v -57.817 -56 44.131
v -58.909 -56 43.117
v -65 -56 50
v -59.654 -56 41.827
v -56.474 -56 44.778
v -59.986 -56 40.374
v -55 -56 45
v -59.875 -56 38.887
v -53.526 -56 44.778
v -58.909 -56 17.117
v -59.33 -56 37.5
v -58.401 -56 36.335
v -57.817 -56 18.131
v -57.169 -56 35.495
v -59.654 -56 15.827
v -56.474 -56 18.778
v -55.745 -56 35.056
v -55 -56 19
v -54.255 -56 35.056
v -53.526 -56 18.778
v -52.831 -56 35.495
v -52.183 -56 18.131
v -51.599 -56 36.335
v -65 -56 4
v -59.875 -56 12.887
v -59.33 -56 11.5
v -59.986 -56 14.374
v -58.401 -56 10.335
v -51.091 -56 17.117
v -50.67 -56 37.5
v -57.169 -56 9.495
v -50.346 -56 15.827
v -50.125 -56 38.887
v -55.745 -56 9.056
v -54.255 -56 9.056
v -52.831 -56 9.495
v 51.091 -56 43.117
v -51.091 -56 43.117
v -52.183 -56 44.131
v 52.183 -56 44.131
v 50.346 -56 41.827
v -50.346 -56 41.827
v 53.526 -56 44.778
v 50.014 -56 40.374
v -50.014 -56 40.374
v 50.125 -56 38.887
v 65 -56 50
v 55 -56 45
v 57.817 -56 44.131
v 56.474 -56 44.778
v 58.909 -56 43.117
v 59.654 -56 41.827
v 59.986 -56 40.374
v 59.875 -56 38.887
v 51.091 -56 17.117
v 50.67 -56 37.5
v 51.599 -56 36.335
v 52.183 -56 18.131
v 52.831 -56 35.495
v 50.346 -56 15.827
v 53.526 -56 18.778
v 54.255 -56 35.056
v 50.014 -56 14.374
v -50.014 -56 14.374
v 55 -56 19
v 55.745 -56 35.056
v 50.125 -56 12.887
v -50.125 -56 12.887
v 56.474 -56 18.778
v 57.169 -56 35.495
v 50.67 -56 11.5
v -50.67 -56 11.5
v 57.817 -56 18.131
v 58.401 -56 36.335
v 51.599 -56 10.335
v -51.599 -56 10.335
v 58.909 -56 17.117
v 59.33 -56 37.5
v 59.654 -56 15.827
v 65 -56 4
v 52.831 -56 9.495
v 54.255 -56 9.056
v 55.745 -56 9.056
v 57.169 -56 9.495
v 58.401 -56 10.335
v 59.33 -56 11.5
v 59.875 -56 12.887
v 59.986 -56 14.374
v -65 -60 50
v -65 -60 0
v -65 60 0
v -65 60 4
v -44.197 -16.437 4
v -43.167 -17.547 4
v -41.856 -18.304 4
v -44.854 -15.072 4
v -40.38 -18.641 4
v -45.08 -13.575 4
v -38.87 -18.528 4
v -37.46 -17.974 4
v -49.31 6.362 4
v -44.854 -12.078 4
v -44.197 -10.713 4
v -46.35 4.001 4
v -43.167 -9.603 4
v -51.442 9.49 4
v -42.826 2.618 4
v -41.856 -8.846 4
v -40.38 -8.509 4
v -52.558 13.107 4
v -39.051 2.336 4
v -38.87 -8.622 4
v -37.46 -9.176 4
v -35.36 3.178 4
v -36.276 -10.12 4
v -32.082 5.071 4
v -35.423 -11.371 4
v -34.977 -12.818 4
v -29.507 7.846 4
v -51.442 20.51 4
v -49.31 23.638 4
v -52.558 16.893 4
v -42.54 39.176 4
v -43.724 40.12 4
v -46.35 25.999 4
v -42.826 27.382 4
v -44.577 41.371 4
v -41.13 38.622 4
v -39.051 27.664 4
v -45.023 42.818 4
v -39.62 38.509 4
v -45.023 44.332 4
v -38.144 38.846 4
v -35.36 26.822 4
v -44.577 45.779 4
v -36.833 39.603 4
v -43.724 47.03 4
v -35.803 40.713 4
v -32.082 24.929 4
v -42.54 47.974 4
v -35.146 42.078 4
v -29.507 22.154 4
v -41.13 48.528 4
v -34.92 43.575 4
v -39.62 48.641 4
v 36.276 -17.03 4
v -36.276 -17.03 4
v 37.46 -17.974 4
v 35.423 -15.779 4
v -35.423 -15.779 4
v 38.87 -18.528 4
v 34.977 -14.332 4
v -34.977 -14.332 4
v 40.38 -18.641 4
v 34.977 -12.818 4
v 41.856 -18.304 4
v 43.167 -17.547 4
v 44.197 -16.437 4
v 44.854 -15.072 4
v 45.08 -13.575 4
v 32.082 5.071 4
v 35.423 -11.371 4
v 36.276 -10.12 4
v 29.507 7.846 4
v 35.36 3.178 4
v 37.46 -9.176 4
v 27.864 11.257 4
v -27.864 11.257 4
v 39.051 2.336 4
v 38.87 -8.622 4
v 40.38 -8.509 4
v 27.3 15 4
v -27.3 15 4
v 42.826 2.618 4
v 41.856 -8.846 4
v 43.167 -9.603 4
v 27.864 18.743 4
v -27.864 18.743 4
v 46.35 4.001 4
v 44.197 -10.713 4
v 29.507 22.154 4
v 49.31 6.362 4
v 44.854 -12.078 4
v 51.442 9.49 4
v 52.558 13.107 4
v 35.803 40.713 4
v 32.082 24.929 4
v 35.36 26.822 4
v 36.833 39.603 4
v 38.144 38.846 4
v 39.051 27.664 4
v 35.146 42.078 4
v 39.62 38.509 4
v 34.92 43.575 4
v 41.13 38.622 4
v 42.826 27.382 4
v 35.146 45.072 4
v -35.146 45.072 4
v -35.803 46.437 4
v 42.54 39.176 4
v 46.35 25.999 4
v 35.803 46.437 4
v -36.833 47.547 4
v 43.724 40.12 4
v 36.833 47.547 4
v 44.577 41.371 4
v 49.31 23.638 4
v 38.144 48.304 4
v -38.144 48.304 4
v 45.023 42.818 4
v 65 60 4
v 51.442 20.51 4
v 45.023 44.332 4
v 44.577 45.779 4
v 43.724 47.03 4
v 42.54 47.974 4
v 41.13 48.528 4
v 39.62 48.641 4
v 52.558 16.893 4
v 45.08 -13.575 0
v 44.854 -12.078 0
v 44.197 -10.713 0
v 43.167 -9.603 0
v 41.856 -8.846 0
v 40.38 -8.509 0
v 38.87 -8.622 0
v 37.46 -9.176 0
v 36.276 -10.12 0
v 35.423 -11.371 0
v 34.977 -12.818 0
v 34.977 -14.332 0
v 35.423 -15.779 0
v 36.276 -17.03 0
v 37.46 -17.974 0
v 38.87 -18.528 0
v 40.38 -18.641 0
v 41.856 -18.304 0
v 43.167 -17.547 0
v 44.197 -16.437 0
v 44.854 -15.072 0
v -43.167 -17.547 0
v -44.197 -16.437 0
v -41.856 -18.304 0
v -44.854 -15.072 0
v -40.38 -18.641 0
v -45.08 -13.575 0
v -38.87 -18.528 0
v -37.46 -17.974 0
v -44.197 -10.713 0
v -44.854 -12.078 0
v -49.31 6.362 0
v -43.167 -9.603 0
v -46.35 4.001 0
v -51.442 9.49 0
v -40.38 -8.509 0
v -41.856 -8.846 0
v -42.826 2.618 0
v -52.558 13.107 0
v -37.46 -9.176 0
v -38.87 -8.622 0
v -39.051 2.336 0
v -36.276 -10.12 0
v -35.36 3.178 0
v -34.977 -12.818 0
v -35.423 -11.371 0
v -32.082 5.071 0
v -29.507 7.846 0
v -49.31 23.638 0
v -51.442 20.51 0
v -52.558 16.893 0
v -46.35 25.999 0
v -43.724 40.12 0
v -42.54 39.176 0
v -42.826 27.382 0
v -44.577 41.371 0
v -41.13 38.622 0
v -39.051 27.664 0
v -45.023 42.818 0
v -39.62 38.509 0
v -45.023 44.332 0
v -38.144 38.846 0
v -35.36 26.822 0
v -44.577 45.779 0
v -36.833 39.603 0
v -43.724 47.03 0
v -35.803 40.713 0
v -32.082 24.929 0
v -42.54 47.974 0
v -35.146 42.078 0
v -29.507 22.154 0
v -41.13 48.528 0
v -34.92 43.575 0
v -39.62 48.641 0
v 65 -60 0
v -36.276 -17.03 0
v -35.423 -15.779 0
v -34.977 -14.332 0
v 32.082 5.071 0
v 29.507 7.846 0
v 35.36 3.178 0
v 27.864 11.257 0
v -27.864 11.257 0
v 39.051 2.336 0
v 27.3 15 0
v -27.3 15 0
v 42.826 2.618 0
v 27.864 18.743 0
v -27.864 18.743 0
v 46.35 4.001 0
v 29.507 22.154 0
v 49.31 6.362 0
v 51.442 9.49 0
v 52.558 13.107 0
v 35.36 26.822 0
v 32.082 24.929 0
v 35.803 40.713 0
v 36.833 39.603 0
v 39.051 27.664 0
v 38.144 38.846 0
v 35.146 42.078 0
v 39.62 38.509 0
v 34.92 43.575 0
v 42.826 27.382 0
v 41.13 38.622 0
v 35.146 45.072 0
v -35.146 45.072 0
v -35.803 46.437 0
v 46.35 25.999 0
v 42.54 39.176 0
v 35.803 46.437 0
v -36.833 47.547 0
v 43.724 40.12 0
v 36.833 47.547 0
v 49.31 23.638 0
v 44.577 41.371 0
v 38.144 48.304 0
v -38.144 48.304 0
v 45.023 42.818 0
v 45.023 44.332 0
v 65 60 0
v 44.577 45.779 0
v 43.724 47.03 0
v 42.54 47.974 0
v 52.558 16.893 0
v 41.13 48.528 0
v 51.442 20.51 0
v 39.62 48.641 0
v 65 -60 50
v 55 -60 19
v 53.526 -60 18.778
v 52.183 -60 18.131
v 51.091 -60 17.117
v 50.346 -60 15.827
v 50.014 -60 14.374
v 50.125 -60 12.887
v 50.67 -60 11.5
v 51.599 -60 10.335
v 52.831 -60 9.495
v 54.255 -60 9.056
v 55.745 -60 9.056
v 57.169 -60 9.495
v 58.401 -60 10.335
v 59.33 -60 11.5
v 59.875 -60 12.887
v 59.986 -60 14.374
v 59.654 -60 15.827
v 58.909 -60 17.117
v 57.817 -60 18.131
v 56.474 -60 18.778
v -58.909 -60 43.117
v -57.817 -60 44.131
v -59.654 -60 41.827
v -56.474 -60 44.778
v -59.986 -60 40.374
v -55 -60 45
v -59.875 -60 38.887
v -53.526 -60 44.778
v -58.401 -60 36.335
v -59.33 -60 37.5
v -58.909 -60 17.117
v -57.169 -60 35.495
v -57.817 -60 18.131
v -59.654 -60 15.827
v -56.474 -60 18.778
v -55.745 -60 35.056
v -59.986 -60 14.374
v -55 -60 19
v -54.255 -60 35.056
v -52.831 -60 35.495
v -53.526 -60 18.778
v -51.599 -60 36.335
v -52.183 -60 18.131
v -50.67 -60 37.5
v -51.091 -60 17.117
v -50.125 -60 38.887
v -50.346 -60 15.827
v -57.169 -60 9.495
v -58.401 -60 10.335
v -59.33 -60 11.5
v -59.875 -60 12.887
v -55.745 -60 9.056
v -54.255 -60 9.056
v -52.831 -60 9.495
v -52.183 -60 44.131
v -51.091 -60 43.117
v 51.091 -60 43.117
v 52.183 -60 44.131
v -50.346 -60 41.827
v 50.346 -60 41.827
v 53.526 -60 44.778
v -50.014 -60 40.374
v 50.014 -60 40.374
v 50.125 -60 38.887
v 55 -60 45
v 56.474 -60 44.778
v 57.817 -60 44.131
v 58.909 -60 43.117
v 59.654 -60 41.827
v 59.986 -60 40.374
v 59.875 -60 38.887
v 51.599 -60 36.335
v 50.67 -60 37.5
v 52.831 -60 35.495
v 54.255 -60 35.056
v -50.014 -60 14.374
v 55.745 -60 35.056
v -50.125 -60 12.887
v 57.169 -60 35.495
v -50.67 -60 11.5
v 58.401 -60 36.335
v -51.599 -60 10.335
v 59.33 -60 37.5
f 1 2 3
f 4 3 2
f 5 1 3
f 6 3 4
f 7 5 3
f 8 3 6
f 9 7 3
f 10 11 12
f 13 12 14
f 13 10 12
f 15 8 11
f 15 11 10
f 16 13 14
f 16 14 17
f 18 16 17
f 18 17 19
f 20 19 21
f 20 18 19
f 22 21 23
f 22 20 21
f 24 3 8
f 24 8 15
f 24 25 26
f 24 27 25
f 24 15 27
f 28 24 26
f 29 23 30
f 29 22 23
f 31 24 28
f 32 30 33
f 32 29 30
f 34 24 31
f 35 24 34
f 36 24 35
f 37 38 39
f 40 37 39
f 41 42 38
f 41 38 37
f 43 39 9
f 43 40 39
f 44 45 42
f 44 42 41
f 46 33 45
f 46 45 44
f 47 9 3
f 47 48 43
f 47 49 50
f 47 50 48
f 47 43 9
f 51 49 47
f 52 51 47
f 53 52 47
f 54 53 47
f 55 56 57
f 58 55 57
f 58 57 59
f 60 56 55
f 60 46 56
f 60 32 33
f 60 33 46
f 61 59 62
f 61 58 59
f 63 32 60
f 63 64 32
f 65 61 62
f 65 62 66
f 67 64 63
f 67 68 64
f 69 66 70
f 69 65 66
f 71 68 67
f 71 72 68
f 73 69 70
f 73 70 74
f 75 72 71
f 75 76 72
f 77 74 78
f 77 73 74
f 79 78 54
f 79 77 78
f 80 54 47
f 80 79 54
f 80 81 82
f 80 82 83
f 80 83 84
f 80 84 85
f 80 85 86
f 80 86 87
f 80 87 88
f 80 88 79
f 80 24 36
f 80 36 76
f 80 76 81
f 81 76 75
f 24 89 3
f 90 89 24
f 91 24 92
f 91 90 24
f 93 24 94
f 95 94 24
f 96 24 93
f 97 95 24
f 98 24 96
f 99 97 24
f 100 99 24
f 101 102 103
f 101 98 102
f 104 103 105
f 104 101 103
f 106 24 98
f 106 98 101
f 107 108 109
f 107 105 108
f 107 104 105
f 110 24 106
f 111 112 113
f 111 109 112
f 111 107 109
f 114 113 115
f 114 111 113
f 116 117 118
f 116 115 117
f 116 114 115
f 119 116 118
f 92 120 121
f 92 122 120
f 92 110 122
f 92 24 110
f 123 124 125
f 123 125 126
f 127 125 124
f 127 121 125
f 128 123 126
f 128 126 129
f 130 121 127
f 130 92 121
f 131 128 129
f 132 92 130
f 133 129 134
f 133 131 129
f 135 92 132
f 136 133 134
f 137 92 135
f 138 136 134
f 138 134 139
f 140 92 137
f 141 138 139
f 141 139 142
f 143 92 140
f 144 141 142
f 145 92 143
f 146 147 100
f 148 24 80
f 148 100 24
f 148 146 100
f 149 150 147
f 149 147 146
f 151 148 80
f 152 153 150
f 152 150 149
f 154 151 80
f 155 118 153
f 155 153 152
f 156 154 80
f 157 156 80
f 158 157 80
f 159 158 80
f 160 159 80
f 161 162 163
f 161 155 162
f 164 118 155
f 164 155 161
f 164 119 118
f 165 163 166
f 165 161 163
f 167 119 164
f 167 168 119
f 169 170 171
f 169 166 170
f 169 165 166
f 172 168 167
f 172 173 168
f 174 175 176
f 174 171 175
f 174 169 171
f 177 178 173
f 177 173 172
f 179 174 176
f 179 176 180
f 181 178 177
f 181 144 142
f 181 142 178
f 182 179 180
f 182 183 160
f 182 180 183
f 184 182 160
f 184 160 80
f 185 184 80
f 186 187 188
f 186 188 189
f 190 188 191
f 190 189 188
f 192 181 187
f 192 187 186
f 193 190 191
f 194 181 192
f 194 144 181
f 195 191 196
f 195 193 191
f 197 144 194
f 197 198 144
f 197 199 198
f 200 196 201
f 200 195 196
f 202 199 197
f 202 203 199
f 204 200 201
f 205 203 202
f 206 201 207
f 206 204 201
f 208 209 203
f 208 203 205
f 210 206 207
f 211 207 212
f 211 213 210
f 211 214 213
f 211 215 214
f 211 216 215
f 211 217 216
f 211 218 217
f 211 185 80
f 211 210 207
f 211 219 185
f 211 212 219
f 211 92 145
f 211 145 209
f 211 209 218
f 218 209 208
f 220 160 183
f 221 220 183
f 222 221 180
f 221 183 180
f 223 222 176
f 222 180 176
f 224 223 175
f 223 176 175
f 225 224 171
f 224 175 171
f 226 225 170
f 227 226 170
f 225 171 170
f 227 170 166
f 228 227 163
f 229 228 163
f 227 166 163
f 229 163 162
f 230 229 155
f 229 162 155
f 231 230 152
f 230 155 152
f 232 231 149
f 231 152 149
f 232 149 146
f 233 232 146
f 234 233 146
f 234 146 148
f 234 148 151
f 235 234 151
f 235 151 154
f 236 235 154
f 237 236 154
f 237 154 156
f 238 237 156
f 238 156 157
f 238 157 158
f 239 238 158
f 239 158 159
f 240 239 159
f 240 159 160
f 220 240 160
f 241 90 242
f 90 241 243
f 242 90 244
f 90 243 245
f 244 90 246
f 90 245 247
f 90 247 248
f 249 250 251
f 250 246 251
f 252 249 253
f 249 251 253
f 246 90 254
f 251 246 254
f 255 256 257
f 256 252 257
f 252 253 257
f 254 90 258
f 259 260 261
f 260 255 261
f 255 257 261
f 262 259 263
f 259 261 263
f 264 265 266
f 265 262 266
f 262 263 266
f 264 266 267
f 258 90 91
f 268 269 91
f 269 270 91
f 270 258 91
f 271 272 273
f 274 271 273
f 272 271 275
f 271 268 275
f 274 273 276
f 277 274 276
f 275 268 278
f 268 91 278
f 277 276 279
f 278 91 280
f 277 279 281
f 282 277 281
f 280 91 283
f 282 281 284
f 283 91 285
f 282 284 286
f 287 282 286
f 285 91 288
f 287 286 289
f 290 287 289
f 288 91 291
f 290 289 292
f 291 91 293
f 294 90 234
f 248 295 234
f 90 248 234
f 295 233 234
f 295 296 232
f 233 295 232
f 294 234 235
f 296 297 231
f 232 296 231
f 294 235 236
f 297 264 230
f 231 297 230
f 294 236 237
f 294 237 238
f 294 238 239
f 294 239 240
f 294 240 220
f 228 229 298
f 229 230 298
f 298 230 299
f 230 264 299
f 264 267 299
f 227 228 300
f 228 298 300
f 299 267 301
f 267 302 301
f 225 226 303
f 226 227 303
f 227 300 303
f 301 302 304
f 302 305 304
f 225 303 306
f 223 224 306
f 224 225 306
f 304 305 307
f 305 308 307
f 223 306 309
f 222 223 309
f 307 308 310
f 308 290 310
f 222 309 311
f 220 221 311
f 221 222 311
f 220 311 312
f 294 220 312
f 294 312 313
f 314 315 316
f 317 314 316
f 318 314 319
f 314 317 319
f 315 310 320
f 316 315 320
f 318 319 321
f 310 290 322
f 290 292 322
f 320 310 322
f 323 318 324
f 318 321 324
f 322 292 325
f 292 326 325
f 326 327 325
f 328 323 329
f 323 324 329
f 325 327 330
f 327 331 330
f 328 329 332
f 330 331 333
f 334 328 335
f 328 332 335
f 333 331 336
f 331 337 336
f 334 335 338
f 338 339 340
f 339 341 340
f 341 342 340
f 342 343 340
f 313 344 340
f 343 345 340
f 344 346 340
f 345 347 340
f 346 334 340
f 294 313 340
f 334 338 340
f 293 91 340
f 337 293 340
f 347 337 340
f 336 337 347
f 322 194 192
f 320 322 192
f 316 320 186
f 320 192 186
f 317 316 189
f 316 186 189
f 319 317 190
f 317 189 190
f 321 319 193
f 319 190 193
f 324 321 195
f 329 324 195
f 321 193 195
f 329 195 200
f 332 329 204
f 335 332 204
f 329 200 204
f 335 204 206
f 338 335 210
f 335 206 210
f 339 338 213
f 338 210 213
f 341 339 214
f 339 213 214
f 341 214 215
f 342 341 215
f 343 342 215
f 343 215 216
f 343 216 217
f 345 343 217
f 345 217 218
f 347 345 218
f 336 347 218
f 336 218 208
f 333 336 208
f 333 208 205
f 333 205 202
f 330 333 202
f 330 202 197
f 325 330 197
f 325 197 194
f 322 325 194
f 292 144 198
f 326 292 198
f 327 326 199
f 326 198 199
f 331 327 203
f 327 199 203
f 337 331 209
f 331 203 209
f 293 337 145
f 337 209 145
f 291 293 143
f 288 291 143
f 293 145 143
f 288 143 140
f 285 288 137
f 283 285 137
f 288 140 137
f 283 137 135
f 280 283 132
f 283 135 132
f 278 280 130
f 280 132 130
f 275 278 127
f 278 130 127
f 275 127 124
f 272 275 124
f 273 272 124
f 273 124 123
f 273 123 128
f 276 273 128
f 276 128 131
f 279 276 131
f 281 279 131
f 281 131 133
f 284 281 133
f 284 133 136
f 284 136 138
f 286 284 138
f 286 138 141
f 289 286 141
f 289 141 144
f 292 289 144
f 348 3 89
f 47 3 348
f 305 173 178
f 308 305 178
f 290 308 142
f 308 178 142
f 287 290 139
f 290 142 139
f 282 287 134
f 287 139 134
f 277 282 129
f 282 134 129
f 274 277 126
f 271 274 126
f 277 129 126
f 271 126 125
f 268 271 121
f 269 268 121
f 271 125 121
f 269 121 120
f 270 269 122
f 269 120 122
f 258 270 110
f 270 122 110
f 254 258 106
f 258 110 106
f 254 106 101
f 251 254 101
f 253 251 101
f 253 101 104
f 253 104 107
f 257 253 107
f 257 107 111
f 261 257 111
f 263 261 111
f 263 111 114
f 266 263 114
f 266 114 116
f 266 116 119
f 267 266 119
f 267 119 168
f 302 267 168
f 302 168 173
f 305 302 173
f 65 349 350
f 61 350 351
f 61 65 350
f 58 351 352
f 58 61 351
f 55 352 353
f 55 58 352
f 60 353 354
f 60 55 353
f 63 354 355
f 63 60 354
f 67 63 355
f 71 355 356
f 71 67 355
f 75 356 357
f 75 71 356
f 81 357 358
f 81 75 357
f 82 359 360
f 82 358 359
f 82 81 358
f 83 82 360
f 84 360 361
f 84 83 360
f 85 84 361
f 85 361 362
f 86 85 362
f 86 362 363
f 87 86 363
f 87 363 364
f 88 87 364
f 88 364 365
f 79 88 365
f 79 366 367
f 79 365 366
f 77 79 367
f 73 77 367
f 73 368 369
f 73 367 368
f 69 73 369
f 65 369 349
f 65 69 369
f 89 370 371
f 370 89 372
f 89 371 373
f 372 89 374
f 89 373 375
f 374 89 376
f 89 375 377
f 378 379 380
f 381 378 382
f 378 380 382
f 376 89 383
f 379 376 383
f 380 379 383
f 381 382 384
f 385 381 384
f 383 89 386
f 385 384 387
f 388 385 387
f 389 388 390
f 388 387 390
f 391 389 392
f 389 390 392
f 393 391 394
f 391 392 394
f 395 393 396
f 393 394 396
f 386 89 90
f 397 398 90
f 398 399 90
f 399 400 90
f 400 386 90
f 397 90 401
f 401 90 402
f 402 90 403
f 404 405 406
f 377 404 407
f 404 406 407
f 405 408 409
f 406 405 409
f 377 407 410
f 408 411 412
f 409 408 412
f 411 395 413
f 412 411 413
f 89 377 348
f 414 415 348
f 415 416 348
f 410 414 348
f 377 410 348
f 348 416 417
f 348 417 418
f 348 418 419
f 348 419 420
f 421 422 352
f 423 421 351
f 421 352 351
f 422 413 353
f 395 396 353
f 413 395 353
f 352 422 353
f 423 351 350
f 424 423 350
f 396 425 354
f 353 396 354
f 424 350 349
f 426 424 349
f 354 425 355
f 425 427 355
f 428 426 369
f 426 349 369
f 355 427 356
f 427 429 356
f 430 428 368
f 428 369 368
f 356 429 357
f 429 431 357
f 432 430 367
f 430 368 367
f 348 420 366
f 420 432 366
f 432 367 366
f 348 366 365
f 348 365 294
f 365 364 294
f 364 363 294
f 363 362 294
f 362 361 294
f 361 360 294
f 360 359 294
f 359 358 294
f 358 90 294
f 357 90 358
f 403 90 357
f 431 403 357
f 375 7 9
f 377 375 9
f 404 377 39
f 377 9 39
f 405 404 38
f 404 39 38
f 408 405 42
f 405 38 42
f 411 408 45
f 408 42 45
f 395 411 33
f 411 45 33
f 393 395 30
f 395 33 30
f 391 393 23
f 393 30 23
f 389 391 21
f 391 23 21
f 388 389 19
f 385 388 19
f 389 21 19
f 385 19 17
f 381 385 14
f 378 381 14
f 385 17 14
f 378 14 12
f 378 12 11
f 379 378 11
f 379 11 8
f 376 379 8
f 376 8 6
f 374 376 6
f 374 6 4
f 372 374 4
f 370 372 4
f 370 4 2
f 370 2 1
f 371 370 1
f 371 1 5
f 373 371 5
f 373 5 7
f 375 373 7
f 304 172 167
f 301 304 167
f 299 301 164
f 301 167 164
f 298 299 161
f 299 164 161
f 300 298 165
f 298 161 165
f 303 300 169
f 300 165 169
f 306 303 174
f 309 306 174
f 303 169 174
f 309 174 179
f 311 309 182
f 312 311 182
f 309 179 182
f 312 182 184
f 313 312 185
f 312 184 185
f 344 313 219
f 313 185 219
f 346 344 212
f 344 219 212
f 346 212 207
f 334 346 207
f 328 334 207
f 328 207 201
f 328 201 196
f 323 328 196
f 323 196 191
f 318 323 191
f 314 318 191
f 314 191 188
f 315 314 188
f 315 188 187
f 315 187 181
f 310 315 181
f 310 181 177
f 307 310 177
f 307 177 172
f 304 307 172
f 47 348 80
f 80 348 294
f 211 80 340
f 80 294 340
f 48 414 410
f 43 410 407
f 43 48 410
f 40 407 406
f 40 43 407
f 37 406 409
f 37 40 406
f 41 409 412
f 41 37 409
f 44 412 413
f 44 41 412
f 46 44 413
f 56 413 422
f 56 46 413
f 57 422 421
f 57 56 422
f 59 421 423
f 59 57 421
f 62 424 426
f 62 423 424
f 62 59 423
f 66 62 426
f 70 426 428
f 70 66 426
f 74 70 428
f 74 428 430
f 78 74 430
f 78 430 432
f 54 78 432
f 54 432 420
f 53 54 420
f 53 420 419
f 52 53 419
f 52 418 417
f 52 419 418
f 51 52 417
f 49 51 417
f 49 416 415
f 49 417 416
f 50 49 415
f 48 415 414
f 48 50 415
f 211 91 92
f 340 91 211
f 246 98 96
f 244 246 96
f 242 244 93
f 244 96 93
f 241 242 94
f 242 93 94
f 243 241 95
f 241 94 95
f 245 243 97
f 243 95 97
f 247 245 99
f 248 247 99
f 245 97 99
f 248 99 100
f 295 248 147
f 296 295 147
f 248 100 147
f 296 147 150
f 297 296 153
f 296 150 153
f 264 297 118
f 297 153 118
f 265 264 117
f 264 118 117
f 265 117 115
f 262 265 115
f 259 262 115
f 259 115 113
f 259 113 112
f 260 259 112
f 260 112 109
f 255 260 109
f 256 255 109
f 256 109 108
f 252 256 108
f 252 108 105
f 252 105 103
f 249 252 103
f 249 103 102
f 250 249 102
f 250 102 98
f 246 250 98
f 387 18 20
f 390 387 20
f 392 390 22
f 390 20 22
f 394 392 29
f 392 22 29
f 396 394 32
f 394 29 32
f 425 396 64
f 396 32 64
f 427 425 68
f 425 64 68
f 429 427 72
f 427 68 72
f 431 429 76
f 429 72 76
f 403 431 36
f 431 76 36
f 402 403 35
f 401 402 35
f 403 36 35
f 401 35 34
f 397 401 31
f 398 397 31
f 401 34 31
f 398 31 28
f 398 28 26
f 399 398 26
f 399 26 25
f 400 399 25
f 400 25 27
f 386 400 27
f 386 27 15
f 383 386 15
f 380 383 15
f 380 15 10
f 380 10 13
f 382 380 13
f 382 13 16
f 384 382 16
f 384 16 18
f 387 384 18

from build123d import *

# Parameters (mm, degrees)
SKETCH1_W           = 130
SKETCH1_H           = 120
BOSS_EXTRUDE1_DEPTH = 4
SKETCH2_R           = 12.7
SKETCH2_R_2         = 5.08
CUT_EXTRUDE1_DEPTH  = 89.549421229
BOSS_EXTRUDE2_START = -4
SKETCH3_W           = 130
SKETCH3_H           = 4
BOSS_EXTRUDE2_DEPTH = 50
SKETCH5_R           = 5
CUT_EXTRUDE2_DEPTH  = 143.059846544


with BuildPart() as part:
    # Sketch1 → Boss-Extrude1 (new body)
    with BuildSketch(Plane.XY):
        Rectangle(SKETCH1_W, SKETCH1_H)
    extrude(amount=BOSS_EXTRUDE1_DEPTH)

    # Sketch2 → Cut-Extrude1 (cut, through all)
    with BuildSketch(Plane.XY.offset(4)):
        with Locations((-40, 15)):
            Circle(SKETCH2_R)
        with Locations((-40, 43.575)):
            Circle(SKETCH2_R_2)
        with Locations(Location((-40, -13.575, 0), (0, 0, 180))):
            Circle(SKETCH2_R_2)
        with Locations((40, -13.575)):
            Circle(SKETCH2_R_2)
        with Locations(Location((40, 15, 0), (0, 0, 180))):
            Circle(SKETCH2_R)
        with Locations(Location((40, 43.575, 0), (0, 0, 180))):
            Circle(SKETCH2_R_2)
    extrude(amount=-CUT_EXTRUDE1_DEPTH, mode=Mode.SUBTRACT)

    # Sketch3 → Boss-Extrude2 (add)
    with BuildSketch(Plane.XY.offset(4).offset(BOSS_EXTRUDE2_START)):
        with Locations((0, -58)):
            Rectangle(SKETCH3_W, SKETCH3_H)
    extrude(amount=BOSS_EXTRUDE2_DEPTH)

    # Sketch5 → Cut-Extrude2 (cut, through all)
    with BuildSketch(Plane(origin=(0, -56, 0), x_dir=(1, 0, 0), z_dir=(0, 1, 0))):
        with Locations(Location((-55, -14, 0), (0, 0, 270))):
            Circle(SKETCH5_R)
        with Locations(Location((-55, -40, 0), (0, 0, 270))):
            Circle(SKETCH5_R)
    cut_extrude2 = extrude(amount=-CUT_EXTRUDE2_DEPTH, mode=Mode.SUBTRACT)

    # Mirror1: Cut-Extrude2 across plane
    add(cut_extrude2.mirror(Plane(origin=(0, 0, 0), x_dir=(0, 0, 1), z_dir=(1, 0, 0))), mode=Mode.SUBTRACT)


solid = part.part
